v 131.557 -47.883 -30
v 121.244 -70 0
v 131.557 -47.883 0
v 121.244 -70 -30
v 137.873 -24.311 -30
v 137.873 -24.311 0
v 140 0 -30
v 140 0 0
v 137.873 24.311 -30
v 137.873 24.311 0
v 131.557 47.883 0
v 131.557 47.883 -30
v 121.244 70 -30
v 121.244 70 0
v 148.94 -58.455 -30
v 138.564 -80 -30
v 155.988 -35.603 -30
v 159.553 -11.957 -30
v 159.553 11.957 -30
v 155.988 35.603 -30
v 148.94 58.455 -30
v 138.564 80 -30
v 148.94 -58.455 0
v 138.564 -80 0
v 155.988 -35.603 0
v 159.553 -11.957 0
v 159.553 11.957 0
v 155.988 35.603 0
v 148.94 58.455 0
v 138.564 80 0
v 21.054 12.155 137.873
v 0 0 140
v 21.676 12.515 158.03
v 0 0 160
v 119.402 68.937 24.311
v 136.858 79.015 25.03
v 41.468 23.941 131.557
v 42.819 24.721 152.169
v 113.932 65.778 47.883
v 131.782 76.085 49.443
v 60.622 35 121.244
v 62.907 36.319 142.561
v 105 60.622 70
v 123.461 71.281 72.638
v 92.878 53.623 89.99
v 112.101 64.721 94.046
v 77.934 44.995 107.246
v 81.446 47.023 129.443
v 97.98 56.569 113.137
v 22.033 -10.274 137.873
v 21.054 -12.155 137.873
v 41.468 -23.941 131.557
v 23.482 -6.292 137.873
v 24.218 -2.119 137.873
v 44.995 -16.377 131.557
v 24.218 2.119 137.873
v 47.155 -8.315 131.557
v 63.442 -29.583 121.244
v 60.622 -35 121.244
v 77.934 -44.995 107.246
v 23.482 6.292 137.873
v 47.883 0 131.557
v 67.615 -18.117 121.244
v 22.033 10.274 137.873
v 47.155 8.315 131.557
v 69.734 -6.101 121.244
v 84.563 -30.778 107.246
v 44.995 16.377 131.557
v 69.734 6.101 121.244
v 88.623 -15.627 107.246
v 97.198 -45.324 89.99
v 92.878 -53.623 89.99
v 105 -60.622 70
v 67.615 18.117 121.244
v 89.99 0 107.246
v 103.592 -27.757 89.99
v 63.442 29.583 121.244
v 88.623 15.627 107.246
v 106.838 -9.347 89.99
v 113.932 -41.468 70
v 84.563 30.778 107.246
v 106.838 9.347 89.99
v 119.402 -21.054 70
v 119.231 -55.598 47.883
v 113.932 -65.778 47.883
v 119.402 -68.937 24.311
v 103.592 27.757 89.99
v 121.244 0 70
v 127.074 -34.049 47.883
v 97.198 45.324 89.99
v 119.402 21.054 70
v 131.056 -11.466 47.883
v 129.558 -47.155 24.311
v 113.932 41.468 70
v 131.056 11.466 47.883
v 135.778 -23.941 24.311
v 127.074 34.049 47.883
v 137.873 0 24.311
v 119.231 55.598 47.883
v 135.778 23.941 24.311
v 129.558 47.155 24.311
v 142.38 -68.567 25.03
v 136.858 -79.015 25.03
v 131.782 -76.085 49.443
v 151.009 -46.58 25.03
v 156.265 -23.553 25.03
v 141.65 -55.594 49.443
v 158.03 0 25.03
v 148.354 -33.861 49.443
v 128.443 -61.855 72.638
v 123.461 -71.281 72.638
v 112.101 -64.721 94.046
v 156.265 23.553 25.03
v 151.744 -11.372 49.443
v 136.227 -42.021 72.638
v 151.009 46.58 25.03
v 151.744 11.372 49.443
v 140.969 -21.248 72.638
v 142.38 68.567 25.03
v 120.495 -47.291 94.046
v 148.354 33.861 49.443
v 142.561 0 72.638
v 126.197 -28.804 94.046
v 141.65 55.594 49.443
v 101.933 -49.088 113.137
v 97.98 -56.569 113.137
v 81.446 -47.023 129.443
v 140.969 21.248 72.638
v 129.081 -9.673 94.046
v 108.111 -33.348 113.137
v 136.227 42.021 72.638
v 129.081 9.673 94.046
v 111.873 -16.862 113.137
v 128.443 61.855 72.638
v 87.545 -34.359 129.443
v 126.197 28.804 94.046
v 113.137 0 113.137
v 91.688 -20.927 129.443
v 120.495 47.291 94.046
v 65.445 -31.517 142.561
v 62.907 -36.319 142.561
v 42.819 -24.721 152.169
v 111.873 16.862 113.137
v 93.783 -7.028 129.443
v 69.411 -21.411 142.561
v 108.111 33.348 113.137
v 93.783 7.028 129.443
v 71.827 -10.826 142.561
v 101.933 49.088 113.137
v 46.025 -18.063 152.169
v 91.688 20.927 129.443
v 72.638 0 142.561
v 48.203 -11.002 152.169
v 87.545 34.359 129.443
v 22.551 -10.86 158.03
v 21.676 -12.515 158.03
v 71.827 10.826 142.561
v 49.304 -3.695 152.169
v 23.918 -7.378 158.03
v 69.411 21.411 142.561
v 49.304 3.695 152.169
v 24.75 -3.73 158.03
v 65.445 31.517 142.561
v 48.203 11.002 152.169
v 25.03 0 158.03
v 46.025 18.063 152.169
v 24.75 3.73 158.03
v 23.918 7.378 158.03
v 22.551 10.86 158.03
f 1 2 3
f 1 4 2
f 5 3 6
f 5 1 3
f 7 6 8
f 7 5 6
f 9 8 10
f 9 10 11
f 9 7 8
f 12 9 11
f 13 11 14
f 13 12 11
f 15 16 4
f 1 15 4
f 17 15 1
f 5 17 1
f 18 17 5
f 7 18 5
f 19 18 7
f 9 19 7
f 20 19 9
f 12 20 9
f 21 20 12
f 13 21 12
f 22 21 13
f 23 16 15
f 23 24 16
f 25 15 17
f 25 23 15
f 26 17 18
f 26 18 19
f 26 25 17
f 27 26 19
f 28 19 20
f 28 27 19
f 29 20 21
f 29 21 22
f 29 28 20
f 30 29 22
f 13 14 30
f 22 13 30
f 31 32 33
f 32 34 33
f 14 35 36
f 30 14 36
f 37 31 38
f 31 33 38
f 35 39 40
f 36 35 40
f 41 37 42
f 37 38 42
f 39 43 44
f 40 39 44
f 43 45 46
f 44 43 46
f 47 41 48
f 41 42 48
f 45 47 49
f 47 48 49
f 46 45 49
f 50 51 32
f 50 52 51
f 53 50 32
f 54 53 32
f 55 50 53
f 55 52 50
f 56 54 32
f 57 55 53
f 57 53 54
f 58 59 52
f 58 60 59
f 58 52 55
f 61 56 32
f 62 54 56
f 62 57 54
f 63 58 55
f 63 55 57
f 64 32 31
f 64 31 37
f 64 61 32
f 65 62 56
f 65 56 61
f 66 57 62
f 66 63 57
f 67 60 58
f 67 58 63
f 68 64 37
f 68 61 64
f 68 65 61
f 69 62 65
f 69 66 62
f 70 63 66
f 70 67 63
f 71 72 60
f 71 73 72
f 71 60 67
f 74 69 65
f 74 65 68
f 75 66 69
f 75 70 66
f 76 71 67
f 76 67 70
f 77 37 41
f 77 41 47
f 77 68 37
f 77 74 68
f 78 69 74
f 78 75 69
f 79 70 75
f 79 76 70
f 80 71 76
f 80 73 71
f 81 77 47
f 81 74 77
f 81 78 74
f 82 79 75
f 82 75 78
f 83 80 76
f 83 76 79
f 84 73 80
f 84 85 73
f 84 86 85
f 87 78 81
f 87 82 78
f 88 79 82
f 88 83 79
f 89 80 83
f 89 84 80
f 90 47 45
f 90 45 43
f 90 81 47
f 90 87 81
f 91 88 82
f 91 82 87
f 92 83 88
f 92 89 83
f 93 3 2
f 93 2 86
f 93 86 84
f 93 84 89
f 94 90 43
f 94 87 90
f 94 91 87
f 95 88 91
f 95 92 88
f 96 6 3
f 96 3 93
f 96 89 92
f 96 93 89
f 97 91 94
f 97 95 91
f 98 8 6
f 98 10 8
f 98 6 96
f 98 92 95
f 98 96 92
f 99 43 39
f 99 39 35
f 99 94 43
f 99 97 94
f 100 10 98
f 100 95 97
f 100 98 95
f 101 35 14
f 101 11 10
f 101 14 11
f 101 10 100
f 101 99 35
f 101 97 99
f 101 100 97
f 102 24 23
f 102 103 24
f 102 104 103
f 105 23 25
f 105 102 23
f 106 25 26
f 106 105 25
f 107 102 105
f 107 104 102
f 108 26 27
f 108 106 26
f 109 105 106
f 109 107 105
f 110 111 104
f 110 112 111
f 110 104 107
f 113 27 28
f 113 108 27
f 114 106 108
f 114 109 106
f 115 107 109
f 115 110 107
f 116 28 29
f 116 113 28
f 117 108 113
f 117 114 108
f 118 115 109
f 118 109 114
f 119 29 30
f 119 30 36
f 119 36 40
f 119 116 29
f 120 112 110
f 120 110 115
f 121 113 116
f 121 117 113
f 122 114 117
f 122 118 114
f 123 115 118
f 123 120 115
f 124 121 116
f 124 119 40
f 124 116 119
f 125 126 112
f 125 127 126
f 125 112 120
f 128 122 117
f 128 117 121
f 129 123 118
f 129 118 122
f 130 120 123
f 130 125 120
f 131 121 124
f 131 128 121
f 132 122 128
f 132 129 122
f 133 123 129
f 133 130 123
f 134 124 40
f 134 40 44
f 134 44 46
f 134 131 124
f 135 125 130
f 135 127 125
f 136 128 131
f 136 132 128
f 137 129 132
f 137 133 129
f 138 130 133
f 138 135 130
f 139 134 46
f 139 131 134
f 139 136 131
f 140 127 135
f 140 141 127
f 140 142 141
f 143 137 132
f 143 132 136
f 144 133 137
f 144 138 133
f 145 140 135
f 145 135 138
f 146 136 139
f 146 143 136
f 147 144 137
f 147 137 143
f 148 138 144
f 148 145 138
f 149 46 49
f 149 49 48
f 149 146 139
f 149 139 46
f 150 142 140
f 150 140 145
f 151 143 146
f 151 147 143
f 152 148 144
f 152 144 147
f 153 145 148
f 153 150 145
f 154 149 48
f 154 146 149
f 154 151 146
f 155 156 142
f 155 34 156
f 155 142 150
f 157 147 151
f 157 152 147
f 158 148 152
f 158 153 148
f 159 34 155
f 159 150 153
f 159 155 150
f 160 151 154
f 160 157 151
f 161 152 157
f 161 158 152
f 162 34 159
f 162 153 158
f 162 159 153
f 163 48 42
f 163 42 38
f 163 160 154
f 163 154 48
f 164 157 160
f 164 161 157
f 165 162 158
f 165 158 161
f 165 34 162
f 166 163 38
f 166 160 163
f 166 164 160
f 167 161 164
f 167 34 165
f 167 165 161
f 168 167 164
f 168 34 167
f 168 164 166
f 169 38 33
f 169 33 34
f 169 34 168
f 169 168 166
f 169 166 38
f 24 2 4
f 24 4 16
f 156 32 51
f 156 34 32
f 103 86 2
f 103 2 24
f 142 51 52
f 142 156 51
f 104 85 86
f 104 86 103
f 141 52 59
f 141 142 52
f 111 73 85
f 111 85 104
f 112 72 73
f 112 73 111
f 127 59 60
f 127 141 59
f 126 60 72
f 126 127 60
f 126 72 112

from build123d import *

# Parameters (mm, degrees)
F2_ANGLE_BACK = 30
F2_ANGLE      = 60


with BuildPart() as f2:
    # F1 (on Front) → F2 (revolve)
    with BuildSketch(Plane.XZ, mode=Mode.PRIVATE) as f2_sk:
        with BuildLine():
            ThreePointArc((0, 140), (98.9949493661, 98.9949493661), (140, 0))
            Line((140, 0), (140, -30))
            Line((140, -30), (160, -30))
            Line((160, -30), (160, 0))
            ThreePointArc((160, 0), (113.1370849898, 113.1370849898), (0, 160))
            Line((0, 160), (0, 140))
        make_face()
    revolve(f2_sk.sketch.rotate(Axis((0, 0, 50), (0, 0, 1)), -F2_ANGLE_BACK), axis=Axis((0, 0, 50), (0, 0, 1)), revolution_arc=F2_ANGLE)


solid = f2.part
